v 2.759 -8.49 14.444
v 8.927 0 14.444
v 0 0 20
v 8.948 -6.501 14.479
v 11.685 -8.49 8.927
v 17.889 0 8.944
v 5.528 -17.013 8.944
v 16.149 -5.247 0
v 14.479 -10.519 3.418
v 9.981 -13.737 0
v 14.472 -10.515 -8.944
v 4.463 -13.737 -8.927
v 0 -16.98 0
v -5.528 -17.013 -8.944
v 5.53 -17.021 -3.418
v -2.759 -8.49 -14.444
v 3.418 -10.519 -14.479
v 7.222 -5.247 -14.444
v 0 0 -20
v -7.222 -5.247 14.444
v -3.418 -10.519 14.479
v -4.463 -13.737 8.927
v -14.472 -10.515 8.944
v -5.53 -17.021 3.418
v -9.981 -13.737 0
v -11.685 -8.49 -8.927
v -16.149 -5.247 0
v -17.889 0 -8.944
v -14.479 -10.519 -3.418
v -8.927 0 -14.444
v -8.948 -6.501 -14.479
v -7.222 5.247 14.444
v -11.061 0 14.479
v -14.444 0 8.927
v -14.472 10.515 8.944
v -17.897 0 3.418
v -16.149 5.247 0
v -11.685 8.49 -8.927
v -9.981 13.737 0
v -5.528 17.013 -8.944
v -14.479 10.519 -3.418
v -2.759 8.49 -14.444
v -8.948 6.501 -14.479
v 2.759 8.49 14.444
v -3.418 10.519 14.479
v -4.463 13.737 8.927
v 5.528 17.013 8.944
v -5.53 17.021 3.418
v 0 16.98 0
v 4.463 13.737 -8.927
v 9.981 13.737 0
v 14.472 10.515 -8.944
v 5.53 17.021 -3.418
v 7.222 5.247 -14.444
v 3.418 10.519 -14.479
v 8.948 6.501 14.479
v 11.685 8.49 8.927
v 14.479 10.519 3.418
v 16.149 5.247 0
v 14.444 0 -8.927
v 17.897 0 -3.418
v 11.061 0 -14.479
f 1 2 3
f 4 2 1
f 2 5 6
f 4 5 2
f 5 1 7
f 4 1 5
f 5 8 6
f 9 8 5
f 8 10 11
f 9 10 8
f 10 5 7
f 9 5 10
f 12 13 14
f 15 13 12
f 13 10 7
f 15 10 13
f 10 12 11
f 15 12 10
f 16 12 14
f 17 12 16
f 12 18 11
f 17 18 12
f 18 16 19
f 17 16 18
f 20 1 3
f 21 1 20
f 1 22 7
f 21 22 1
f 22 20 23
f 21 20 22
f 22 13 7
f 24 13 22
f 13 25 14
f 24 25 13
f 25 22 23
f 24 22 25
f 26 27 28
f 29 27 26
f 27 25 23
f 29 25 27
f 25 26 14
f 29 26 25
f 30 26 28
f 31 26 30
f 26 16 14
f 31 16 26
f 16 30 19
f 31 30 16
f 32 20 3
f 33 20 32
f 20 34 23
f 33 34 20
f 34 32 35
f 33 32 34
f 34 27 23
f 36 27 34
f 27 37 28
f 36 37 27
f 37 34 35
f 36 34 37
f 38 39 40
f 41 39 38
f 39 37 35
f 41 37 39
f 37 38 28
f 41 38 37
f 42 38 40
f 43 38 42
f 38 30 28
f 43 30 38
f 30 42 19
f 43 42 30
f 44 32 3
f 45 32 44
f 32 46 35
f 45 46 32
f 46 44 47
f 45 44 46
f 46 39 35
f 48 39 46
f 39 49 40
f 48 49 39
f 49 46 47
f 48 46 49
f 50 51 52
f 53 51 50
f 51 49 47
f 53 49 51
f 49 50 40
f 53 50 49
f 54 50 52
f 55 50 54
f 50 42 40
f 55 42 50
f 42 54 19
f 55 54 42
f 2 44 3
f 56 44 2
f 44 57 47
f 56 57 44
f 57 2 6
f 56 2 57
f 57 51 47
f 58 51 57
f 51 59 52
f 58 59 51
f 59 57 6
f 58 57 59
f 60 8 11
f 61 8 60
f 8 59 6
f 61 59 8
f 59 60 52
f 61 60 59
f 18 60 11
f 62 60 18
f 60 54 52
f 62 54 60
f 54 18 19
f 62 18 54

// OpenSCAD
/*[Dial-a-hedron -- Stellated Polyhedron Custom Designer]*/
/*
Subdivide each of the icosahedron regular triangle face to 
3 kites, each defined by a vertex of the face,
2 midpoints of edges on both sides of the vertex, and
the center of triangle [equivalently the vertex of the dodecahedron (dual of the icosahedron)].
Dial by varying the radius of the midpoints and/or center relative to the vertex;
theta and phi of the spherical coordinates remain the same.

Kite is not necessarily coplanar.
Subdivide kite into triangles (2 ways) --
Split along long kite diagonal: vertex-center-midpoint and vertex-center-other-midpoint
Split along short kite diagonal: vertex-midpoint-midpoint and center-midpoint-midpoint

split_type	center_ratio	mid_pt_ratio	model
0 or 1		1.255		1.173		dodecahedron
0 or 1		0.793		0.849		icosahedron
0		0.911		0.849		icosahedron dodecahedron compound
0 or 1		0.957		0.975		deltoidal hexecontahedron
0		0.911		0.975		pentakis icosidodecahedron
0		1.093		1.173		icosidodecahedron
1		0.911		0.849		rhombic triacontahedron
1		1.066		0.849		small triambic icosahedron
1		1.170		1.008		small icosacronic hexecontahedron
1		1.000		0.934		pentakis dodecahedron
1		0.911		1.051		golden 120 (first stellation of rhombic triacontahedron)
1		1.066		1.376		octahedron 5 compound
*/
//
	Mode = 0; //[1:dodecahedron,2:icosahedron,3:icosahedron+dodecahedron,9:deltoidal hexecontahedron,10:pentakis icosidodecahedron,11:icosidodecahedron,8:rhombic triacontahedron,7:small triambic icosahedron,6:small icosacronic hexecontahedron,12:pentakis dodecahedron,5:golden 120,4:5 octahedra,0:Customize with values below]
//splitting the 3 kites on a icosahedron face by their
	Split_Type = 0; //[0:0=short diagonal,1:1=long diagonal]
//ratio of face center radius to icosahedron vertex radius
	Center_Ratio = 0.911;	//[0:0.001:1.5]
//ratio of edge midpoint radius to icosahedron vertex radius
	Mid_pt_Ratio = 0.849;	//[0:0.001:1.5]

/*****************************************************************************/
//	Dial-a-hedron Stellated Polyhedron Custom Designer is licensed under
//	MIT License
//
//	Copyright (c) 2026 DrT0M
//
//	Permission is hereby granted, free of charge, to any person obtaining a copy
//	of this software and associated documentation files (the "Software"), to deal
//	in the Software without restriction, including without limitation the rights
//	to use, copy, modify, merge, publish, distribute, sublicense, and/or sell
//	copies of the Software, and to permit persons to whom the Software is
//	furnished to do so, subject to the following conditions:
//	
//	The above copyright notice and this permission notice shall be included in all
//	copies or substantial portions of the Software.
//
//	THE SOFTWARE IS PROVIDED "AS IS", WITHOUT WARRANTY OF ANY KIND, EXPRESS OR
//	IMPLIED, INCLUDING BUT NOT LIMITED TO THE WARRANTIES OF MERCHANTABILITY,
//	FITNESS FOR A PARTICULAR PURPOSE AND NONINFRINGEMENT. IN NO EVENT SHALL THE
//	AUTHORS OR COPYRIGHT HOLDERS BE LIABLE FOR ANY CLAIM, DAMAGES OR OTHER
//	LIABILITY, WHETHER IN AN ACTION OF CONTRACT, TORT OR OTHERWISE, ARISING FROM,
//	OUT OF OR IN CONNECTION WITH THE SOFTWARE OR THE USE OR OTHER DEALINGS IN THE
//	SOFTWARE.
//
{}	//tab stop @ 8
/*****************************************************************************/
	split_type =	( Mode == 1 ?	0	//dodecahedron
		:	( Mode == 2 ?	0	//icosahedron
		:	( Mode == 3 ?	0	//icosahedron dodecahedron compound
		:	( Mode == 4 ?	1	//octahedron 5 compound
		:	( Mode == 5 ?	1	//golden 120
		:	( Mode == 6 ?	1	//small icosacronic hexecontahedron
		:	( Mode == 7 ?	1	//small triambic icosahedron
		:	( Mode == 8 ?	1	//rhombic triacontahedron
		:	( Mode == 9 ?	1	//deltoidal hexecontahedron
		:	( Mode == 10 ?	0	//pentakis icosidodecahedron
		:	( Mode == 11 ?	0	//icosidodecahedron
		:	( Mode == 12 ?	1	//pentakis dodecahedron
		:	/*Mode == 0*/	Split_Type ))))))))))));

	center_ratio =	( Mode == 1 ?	1.255	//dodecahedron
		:	( Mode == 2 ?	0.793	//icosahedron
		:	( Mode == 3 ?	0.911	//icosahedron dodecahedron compound
		:	( Mode == 4 ?	1.066	//octahedron 5 compound
		:	( Mode == 5 ?	0.911	//golden 120
		:	( Mode == 6 ?	1.170	//small icosacronic hexecontahedron
		:	( Mode == 7 ?	1.066	//small triambic icosahedron
		:	( Mode == 8 ?	0.911	//rhombic triacontahedron
		:	( Mode == 9 ?	0.957	//deltoidal hexecontahedron
		:	( Mode == 10 ?	0.911	//pentakis icosidodecahedron
		:	( Mode == 11 ?	1.093	//icosidodecahedron
		:	( Mode == 12 ?	1.000	//pentakis dodecahedron
		:	/*Mode == 0*/	Center_Ratio ))))))))))));

	mid_pt_ratio =	( Mode == 1 ?	1.173	//dodecahedron
		:	( Mode == 2 ?	0.849	//icosahedron
		:	( Mode == 3 ?	0.849	//icosahedron dodecahedron compound
		:	( Mode == 4 ?	1.376	//octahedron 5 compound
		:	( Mode == 5 ?	1.051	//golden 120
		:	( Mode == 6 ?	1.008	//small icosacronic hexecontahedron
		:	( Mode == 7 ?	0.849	//small triambic icosahedron
		:	( Mode == 8 ?	0.849	//rhombic triacontahedron
		:	( Mode == 9 ?	0.975	//deltoidal hexecontahedron
		:	( Mode == 10 ?	0.975	//pentakis icosidodecahedron
		:	( Mode == 11 ?	1.173	//icosidodecahedron
		:	( Mode == 12 ?	0.934	//pentakis dodecahedron
		:	/*Mode == 0*/	Mid_pt_Ratio ))))))))))));

//echo("Mode=", Mode, "split_type=", split_type, "center_ratio=", center_ratio, "mid_pt_ratio=", mid_pt_ratio);

/*****************************************************************************/
G = (sqrt(5)+1)/2;		//Golden ratio
cos_t = 1/sqrt(5);		//triangle with side lengths 1,2,5
sin_t = 2*cos_t;		//	2/sqrt(5);
tan_t = 2;
t = atan(2);			//theta
r = 1;

b = 1;	c = 0;		//subdivision description
T = b^2 + b*c + c^2;	//triangulation number
Npoints = 10*T + 2;
Nfacets = 20*T;
Njoints = 30*T;

icosahedron_sphord=		//	physics convention: radial distance, polar angle, azimuthal angle
[[r	,t	,0	]	//0
,[r	,180-t	,-36	]	//1
,[r	,t	,-72	]	//2
,[r	,180-t	,-108	]	//3
,[r	,t	,-144	]	//4
,[r	,180-t	,180	]	//5
,[r	,t	,144	]	//6
,[r	,180-t	,108	]	//7
,[r	,t	,72	]	//8
,[r	,180-t	,36	]	//9
,[r	,0	,0	]	//10	North Pole
,[r	,180	,0	]	//11	South Pole
];
//12 vertices
icosahedron_points = spherical_to_cartesian( icosahedron_sphord );

function spherical_to_cartesian( spherical_coords ) =
//spherical to cartesian
//z = r cos_theta
//y = r sin_theta sin_phi
//x = r sin_theta cos_phi
[
	for( coord = spherical_coords )
	let(	r = coord[ 0 ]	//radial (from center)
	,	t = coord[ 1 ]	//theta (from north pole/90-latitude)
	,	p = coord[ 2 ]	//phi (longitude/prime meridian)
	,	z = r*cos(t),	r_sin_t = r*sin(t)
	,	y = r_sin_t*sin(p)
	,	x = r_sin_t*cos(p)
	)
	[x,y,z]
];

function cartesian_to_spherical( cartesian_coords ) =
//cartesian_to_spherical
[
	for( coord = cartesian_coords )
	let(	x = coord[ 0 ]
	,	y = coord[ 1 ]
	,	z = coord[ 2 ]
	,	r_cos_t = z
	,	r_sin_t = sqrt(x^2+y^2)
//	,	r = sqrt(x^2+y^2+z^2)		//radial (from center)
	,	r = norm(coord)			//radial (from center)
	,	t = atan2(r_sin_t,r_cos_t)	//theta (from north pole/90-latitude)
	,	p = atan2(y,x)			//phi (longitude/prime meridian)
	)
	[r,t,p]
];
//20 equilateral triangles
icosahedron_facets=
[	[10	,0	,2	],	[0	,1	,2	],	[3	,2	,1	],	[3	,1	,11	]
,	[10	,2	,4	],	[2	,3	,4	],	[5	,4	,3	],	[5	,3	,11	]
,	[10	,4	,6	],	[4	,5	,6	],	[7	,6	,5	],	[7	,5	,11	]
,	[10	,6	,8	],	[6	,7	,8	],	[9	,8	,7	],	[9	,7	,11	]
,	[10	,8	,0	],	[8	,9	,0	],	[1	,0	,9	],	[1	,9	,11	]
];//	NP:north circumpolar		NQ:north equatorial		SQ:south equatorial		SP:south circumpolar		

/*****************************************************************************/
edge_middle_cartes =
[
	for(k=[0:len(icosahedron_facets)-1])
	[	(icosahedron_points[icosahedron_facets[k][0]].x
		+icosahedron_points[icosahedron_facets[k][1]].x)/2
	,	(icosahedron_points[icosahedron_facets[k][0]].y
		+icosahedron_points[icosahedron_facets[k][1]].y)/2
	,	(icosahedron_points[icosahedron_facets[k][0]].z
		+icosahedron_points[icosahedron_facets[k][1]].z)/2
	]
	,
	for(k=[0:len(icosahedron_facets)-1])
	[	(icosahedron_points[icosahedron_facets[k][1]].x
		+icosahedron_points[icosahedron_facets[k][2]].x)/2
	,	(icosahedron_points[icosahedron_facets[k][1]].y
		+icosahedron_points[icosahedron_facets[k][2]].y)/2
	,	(icosahedron_points[icosahedron_facets[k][1]].z
		+icosahedron_points[icosahedron_facets[k][2]].z)/2
	]
	,
	for(k=[0:len(icosahedron_facets)-1])
	[	(icosahedron_points[icosahedron_facets[k][2]].x
		+icosahedron_points[icosahedron_facets[k][0]].x)/2
	,	(icosahedron_points[icosahedron_facets[k][2]].y
		+icosahedron_points[icosahedron_facets[k][0]].y)/2
	,	(icosahedron_points[icosahedron_facets[k][2]].z
		+icosahedron_points[icosahedron_facets[k][0]].z)/2
	]
];

edge_middle_spheric = cartesian_to_spherical( edge_middle_cartes );
//	echo("edge_middle_spheric[0]",edge_middle_spheric[0]);

edge_middle_points = spherical_to_cartesian(
[
	for(k=[0:len(edge_middle_spheric)-1])
	[//	edge_middle_spheric[k][0]
//		0.85	//planar (unit icosahedron)
//		0.935	//icosahedron dodecahedron ball
		mid_pt_ratio
	,	edge_middle_spheric[k][1]
	,	edge_middle_spheric[k][2]
	]
]);

/*****************************************************************************/
//20 vertices
dodecahedron_cartes=
[
	for(k=[0:len(icosahedron_facets)-1])
	[	(icosahedron_points[icosahedron_facets[k][0]].x
		+icosahedron_points[icosahedron_facets[k][1]].x
		+icosahedron_points[icosahedron_facets[k][2]].x)/3
	,	(icosahedron_points[icosahedron_facets[k][0]].y
		+icosahedron_points[icosahedron_facets[k][1]].y
		+icosahedron_points[icosahedron_facets[k][2]].y)/3
	,	(icosahedron_points[icosahedron_facets[k][0]].z
		+icosahedron_points[icosahedron_facets[k][1]].z
		+icosahedron_points[icosahedron_facets[k][2]].z)/3
	]
];

dodecahedron_spheric = cartesian_to_spherical( dodecahedron_cartes );
//	echo("dodecahedron_spheric[0]",dodecahedron_spheric[0]);

dodecahedron_points = spherical_to_cartesian( 
[
	for(k=[0:len(dodecahedron_spheric)-1])
	[//	dodecahedron_spheric[k][0]
//		0.79	//planar (unit icosahedron)
//		0.91	//icosahedron dodecahedron compound
//		1	//icosahedron dodecahedron ball
		center_ratio
	,	dodecahedron_spheric[k][1]
	,	dodecahedron_spheric[k][2]
	]
]);

/*****************************************************************************/
dialahedron_points=
[	each	icosahedron_points	//12 vertices
,	each	dodecahedron_points	//20 vertices
,	each	edge_middle_points	//60
];

dialahedron_facets_long =	//golden 120, 5 octahedra
[
	for(k=[0:len(icosahedron_facets)-1])	//0:19
	let(	center = k+12
	,	midpt0 = k+12+20
	,	midpt1 = k+12+40
	,	midpt2 = k+12+60
	,	vertex0 = icosahedron_facets[k][0]
	,	vertex1 = icosahedron_facets[k][1]
	,	vertex2 = icosahedron_facets[k][2]
	)
	//vertex, midpoint, center	//vertex, center, midpoint
	each [	[	vertex0	,	center	,	midpt2	]
	,	[	vertex0	,	midpt0	,	center	]
	,	[	vertex1	,	center	,	midpt0	]
	,	[	vertex1	,	midpt1	,	center	]
	,	[	vertex2	,	center	,	midpt1	]
	,	[	vertex2	,	midpt2	,	center	]
	]
];

dialahedron_facets_short = 	//icosahedron_dodecahedron
[
	for(k=[0:len(icosahedron_facets)-1])	//0:19
	let(	center = k+12
	,	midpt0 = k+12+20
	,	midpt1 = k+12+40
	,	midpt2 = k+12+60
	,	vertex0 = icosahedron_facets[k][0]
	,	vertex1 = icosahedron_facets[k][1]
	,	vertex2 = icosahedron_facets[k][2]
	)
	//vertex, midpoint, midpoint  	//center, midpoint, midpoint
	each [	[	vertex0	,	midpt0	,	midpt2	]
	,	[	midpt2	,	midpt0	,	center	]
	,	[	vertex1	,	midpt1	,	midpt0	]
	,	[	midpt0	,	midpt1	,	center	]
	,	[	vertex2	,	midpt2	,	midpt1	]
	,	[	midpt1	,	midpt2	,	center	]
	]
];

dialahedron_facets = split_type == 0
?	dialahedron_facets_short
:	dialahedron_facets_long
;

scale(20)
	polyhedron( dialahedron_points, dialahedron_facets, convexity=2 );
